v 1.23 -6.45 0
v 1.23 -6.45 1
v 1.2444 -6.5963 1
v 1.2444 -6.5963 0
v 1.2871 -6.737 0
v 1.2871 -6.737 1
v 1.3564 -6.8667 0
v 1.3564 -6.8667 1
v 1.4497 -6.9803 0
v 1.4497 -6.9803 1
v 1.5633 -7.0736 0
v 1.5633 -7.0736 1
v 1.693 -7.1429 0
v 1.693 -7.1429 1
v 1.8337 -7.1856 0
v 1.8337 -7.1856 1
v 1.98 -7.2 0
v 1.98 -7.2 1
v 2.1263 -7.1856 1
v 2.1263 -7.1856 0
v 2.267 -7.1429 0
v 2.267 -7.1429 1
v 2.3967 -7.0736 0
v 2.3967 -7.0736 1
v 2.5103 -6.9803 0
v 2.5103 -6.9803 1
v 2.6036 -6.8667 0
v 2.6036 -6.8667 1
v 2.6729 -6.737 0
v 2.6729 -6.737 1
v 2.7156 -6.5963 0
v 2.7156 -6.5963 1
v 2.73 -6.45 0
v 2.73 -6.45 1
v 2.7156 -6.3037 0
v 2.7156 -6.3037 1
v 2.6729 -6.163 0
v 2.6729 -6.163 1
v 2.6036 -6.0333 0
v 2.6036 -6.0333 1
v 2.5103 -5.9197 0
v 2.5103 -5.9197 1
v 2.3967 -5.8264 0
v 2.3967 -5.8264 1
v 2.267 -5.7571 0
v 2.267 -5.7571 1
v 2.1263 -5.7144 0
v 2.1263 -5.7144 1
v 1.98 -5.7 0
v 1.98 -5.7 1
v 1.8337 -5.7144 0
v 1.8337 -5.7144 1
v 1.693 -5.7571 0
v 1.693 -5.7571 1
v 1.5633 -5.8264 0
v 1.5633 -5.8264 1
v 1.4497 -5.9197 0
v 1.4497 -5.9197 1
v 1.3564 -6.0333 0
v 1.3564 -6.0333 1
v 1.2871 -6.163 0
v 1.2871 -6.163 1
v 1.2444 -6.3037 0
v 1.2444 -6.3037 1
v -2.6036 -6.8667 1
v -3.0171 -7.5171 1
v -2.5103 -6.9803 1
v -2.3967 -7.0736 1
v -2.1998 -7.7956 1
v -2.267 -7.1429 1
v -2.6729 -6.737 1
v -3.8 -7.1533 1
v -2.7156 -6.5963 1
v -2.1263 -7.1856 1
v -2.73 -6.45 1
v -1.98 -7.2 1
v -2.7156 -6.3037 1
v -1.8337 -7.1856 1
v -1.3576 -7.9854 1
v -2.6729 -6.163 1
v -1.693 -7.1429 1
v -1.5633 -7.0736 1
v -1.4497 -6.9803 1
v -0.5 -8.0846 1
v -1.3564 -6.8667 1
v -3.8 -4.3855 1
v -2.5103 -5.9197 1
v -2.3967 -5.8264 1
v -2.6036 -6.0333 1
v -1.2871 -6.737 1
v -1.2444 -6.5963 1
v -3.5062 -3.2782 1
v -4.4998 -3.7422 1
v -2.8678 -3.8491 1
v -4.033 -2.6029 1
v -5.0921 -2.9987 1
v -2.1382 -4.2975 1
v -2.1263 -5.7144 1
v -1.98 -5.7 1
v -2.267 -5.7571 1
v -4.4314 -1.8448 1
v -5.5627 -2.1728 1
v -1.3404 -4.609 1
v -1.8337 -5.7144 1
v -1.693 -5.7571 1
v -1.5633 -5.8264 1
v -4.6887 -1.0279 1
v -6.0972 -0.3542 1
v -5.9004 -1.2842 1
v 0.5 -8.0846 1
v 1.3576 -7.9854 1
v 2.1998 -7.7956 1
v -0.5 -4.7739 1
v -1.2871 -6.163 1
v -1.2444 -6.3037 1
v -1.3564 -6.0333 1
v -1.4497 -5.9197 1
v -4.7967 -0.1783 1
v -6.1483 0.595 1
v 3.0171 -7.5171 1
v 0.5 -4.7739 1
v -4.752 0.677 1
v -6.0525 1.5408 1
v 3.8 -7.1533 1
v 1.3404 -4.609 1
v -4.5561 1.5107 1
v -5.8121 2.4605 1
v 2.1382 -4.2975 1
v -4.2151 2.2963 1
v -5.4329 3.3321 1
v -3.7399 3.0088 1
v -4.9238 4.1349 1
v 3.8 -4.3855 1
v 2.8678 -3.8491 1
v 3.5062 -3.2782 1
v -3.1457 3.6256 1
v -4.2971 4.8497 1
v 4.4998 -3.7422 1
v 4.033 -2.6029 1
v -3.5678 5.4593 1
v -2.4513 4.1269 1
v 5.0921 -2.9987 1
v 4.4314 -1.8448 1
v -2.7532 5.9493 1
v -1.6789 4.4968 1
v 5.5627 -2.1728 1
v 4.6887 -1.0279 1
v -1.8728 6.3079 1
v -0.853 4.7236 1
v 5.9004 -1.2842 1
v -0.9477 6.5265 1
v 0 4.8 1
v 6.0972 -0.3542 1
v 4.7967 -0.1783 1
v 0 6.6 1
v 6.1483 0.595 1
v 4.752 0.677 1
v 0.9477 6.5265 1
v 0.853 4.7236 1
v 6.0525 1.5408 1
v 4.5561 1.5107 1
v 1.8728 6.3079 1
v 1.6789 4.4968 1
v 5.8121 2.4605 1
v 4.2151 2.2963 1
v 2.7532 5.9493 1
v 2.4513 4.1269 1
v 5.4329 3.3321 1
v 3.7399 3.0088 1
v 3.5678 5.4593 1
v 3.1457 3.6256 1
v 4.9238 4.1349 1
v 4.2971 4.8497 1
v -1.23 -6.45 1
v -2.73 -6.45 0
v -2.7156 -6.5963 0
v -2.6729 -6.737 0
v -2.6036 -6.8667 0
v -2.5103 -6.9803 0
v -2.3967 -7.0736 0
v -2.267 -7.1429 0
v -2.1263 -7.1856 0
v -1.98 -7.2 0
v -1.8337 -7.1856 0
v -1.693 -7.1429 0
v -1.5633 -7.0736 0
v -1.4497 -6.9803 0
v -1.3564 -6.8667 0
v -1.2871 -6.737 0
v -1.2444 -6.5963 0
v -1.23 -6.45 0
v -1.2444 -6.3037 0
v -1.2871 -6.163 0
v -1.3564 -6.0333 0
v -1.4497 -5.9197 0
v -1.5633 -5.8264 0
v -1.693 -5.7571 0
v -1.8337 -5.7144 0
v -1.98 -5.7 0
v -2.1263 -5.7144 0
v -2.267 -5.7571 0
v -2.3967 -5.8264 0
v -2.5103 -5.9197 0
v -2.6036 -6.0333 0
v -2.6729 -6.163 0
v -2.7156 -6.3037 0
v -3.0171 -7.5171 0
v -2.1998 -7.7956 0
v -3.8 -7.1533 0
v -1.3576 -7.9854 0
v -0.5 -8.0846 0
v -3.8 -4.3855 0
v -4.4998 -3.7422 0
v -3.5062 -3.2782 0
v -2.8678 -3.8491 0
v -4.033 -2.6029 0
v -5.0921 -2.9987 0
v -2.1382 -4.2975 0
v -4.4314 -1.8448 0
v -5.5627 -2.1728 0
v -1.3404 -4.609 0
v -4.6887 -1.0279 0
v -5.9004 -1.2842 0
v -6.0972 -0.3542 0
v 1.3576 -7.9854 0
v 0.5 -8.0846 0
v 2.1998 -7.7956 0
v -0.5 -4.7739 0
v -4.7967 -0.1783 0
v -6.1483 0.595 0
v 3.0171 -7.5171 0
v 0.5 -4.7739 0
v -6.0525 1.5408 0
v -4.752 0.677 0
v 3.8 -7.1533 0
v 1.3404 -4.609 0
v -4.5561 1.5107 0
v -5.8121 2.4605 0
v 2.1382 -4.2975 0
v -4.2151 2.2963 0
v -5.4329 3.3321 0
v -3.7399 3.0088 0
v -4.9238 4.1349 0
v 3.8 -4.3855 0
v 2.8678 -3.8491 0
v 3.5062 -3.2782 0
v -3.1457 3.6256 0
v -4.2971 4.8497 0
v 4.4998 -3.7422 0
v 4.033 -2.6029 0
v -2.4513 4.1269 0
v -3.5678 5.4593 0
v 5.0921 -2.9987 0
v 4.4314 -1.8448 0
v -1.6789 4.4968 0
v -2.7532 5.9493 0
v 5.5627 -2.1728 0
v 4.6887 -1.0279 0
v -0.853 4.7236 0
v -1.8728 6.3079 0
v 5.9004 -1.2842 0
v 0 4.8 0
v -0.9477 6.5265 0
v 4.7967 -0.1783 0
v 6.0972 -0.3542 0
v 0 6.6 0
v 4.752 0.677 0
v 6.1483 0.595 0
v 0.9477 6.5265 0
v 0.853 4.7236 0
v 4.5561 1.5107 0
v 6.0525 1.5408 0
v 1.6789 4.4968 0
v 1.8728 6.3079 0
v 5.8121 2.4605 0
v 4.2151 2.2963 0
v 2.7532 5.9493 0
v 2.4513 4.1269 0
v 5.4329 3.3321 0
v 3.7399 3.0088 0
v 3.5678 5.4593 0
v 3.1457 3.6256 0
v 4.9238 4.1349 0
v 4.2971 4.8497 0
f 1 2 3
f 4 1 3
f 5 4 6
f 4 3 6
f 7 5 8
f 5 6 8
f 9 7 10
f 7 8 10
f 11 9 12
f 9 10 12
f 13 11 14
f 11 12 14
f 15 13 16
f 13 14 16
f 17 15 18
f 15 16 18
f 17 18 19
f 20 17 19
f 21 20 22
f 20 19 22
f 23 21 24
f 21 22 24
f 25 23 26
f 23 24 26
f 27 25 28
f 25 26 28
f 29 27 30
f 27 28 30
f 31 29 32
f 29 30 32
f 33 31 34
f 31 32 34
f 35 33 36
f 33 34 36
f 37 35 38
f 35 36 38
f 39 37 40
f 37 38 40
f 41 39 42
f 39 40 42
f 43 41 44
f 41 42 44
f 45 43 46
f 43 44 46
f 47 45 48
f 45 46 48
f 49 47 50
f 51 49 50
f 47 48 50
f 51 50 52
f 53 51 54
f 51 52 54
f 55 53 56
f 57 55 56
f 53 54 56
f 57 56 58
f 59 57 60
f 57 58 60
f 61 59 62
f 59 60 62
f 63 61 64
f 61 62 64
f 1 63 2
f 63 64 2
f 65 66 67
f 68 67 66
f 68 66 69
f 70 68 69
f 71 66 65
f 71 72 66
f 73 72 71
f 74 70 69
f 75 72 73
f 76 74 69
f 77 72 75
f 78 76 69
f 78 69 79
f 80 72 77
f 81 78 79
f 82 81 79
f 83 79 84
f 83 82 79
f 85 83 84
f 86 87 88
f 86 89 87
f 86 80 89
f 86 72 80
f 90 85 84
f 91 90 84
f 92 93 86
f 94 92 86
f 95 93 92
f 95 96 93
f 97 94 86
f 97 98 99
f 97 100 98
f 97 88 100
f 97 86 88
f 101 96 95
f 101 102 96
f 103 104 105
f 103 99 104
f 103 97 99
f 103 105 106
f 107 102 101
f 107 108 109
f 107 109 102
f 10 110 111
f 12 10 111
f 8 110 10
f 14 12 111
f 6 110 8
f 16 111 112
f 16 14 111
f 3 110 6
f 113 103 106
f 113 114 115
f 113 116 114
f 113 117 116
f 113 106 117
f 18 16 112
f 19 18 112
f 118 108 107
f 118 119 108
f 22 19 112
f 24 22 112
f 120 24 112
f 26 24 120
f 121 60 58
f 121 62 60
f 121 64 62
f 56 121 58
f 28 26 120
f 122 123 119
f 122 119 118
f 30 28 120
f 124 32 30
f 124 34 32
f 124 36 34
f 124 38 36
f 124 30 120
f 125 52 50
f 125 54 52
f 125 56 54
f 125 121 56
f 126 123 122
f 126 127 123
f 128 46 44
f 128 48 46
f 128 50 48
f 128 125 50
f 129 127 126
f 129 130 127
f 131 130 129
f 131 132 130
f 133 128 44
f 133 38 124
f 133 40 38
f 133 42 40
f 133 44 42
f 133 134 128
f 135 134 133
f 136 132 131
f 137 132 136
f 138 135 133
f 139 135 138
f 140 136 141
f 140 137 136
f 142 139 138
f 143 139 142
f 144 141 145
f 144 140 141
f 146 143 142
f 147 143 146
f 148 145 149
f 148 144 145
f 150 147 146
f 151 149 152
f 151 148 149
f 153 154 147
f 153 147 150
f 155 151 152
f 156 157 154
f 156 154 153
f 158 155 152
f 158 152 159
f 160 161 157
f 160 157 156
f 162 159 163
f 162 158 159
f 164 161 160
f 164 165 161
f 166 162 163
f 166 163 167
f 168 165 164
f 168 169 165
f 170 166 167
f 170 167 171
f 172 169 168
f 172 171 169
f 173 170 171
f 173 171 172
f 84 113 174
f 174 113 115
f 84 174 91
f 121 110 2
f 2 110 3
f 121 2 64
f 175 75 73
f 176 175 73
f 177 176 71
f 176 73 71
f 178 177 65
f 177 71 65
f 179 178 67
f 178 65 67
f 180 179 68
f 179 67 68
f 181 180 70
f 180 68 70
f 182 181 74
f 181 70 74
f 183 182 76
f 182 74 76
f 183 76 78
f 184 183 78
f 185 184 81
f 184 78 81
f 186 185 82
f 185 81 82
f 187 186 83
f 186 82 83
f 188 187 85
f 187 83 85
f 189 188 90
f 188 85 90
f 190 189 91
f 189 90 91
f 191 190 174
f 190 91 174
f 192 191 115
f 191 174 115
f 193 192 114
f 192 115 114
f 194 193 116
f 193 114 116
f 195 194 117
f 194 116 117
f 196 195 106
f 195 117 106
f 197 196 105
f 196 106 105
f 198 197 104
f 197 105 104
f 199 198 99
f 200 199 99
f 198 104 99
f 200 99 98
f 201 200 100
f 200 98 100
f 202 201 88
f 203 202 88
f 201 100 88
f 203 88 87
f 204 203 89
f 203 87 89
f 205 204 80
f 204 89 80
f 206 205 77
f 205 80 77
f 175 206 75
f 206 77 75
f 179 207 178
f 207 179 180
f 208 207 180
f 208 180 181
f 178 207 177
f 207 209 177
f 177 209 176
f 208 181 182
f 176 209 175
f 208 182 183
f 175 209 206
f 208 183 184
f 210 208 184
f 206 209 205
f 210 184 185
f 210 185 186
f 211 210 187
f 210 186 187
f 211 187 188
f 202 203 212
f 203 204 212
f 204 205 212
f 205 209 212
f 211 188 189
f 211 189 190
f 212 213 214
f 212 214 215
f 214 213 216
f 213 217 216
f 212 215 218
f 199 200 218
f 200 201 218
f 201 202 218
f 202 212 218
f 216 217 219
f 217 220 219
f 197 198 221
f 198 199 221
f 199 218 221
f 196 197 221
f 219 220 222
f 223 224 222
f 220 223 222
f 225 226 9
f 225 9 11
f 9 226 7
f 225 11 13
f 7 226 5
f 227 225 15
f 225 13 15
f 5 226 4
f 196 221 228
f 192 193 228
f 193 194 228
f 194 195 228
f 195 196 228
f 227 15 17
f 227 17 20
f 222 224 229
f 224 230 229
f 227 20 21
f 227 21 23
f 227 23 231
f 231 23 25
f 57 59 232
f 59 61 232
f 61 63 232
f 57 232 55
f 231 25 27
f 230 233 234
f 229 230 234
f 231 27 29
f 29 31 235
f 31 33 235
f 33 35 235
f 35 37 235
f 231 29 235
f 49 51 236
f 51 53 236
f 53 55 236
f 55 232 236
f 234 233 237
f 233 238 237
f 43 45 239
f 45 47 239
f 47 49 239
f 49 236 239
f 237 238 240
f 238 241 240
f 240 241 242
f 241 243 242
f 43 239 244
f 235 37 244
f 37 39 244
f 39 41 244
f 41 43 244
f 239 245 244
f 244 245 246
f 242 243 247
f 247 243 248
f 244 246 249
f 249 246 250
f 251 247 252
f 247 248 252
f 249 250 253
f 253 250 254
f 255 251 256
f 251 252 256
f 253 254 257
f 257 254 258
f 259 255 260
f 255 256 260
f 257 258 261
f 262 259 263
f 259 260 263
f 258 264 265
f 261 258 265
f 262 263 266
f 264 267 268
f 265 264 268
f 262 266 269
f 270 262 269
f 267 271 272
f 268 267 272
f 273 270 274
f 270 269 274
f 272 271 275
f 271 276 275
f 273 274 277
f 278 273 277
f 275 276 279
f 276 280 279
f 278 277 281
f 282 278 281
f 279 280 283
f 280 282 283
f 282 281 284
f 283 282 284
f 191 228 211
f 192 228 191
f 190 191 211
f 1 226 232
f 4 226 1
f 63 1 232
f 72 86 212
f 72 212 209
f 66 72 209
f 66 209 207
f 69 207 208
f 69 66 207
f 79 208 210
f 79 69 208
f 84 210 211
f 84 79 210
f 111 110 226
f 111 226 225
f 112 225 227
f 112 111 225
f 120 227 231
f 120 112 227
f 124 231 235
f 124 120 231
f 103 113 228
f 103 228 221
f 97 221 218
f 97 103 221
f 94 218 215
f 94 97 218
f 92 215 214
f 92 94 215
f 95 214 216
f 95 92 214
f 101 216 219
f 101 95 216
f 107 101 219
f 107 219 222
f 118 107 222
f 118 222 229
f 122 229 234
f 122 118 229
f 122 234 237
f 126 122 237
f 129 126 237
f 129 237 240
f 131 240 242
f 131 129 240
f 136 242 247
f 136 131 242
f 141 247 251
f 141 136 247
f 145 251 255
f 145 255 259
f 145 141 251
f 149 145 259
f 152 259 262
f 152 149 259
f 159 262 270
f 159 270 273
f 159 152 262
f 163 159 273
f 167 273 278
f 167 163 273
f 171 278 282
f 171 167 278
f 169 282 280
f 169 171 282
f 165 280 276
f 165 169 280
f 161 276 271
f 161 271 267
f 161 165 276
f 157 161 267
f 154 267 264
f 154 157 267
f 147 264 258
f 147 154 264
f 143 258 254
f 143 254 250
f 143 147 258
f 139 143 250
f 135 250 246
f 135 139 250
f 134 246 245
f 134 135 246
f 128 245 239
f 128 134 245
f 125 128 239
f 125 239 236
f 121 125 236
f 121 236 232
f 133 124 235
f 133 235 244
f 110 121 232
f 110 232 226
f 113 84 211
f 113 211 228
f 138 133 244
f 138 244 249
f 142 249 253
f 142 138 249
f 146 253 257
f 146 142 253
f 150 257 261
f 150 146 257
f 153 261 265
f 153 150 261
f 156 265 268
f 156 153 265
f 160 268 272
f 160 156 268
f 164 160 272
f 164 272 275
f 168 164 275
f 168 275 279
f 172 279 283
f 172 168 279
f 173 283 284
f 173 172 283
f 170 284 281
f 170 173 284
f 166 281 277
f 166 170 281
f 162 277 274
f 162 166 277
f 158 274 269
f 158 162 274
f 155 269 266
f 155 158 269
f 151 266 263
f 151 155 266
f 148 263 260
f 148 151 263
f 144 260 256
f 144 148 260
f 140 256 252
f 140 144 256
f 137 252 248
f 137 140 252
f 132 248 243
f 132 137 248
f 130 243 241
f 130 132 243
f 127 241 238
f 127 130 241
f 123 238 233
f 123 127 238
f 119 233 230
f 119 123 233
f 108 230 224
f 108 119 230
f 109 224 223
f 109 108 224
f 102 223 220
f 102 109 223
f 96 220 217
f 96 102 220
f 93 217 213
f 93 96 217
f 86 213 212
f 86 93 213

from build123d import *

# Parameters (mm, degrees)
SKIZZE1_R                       = 0.75
AUFSATZ_LINEAR_AUSTRAGEN1_DEPTH = 1


with BuildPart() as part:
    # Skizze1 → Aufsatz-Linear austragen1 (new body)
    with BuildSketch(Plane.XY.offset(1)):
        with BuildLine():
            Line((-0.5, -8.084553173), (-0.5, -4.773887305))
            ThreePointArc((-0.5, -4.773887305), (0, 4.8), (0.5, -4.773887305))
            Line((0.5, -4.773887305), (0.5, -8.084553173))
            ThreePointArc((0.5, -8.084553173), (2.199840536, -7.79555653), (3.8, -7.153320907))
            Line((3.8, -7.153320907), (3.8, -4.385545471))
            ThreePointArc((3.8, -4.385545471), (0, 6.6), (-3.8, -4.385545471))
            Line((-3.8, -4.385545471), (-3.8, -7.153320907))
            ThreePointArc((-3.8, -7.153320907), (-2.199840536, -7.79555653), (-0.5, -8.084553173))
        make_face()
        with Locations(Location((1.98, -6.45, 0), (0, 0, 180))):
            Circle(SKIZZE1_R, mode=Mode.SUBTRACT)
        with Locations(Location((-1.98, -6.45, 0), (0, 0, 180))):
            Circle(SKIZZE1_R, mode=Mode.SUBTRACT)
    extrude(amount=-AUFSATZ_LINEAR_AUSTRAGEN1_DEPTH)


solid = part.part
